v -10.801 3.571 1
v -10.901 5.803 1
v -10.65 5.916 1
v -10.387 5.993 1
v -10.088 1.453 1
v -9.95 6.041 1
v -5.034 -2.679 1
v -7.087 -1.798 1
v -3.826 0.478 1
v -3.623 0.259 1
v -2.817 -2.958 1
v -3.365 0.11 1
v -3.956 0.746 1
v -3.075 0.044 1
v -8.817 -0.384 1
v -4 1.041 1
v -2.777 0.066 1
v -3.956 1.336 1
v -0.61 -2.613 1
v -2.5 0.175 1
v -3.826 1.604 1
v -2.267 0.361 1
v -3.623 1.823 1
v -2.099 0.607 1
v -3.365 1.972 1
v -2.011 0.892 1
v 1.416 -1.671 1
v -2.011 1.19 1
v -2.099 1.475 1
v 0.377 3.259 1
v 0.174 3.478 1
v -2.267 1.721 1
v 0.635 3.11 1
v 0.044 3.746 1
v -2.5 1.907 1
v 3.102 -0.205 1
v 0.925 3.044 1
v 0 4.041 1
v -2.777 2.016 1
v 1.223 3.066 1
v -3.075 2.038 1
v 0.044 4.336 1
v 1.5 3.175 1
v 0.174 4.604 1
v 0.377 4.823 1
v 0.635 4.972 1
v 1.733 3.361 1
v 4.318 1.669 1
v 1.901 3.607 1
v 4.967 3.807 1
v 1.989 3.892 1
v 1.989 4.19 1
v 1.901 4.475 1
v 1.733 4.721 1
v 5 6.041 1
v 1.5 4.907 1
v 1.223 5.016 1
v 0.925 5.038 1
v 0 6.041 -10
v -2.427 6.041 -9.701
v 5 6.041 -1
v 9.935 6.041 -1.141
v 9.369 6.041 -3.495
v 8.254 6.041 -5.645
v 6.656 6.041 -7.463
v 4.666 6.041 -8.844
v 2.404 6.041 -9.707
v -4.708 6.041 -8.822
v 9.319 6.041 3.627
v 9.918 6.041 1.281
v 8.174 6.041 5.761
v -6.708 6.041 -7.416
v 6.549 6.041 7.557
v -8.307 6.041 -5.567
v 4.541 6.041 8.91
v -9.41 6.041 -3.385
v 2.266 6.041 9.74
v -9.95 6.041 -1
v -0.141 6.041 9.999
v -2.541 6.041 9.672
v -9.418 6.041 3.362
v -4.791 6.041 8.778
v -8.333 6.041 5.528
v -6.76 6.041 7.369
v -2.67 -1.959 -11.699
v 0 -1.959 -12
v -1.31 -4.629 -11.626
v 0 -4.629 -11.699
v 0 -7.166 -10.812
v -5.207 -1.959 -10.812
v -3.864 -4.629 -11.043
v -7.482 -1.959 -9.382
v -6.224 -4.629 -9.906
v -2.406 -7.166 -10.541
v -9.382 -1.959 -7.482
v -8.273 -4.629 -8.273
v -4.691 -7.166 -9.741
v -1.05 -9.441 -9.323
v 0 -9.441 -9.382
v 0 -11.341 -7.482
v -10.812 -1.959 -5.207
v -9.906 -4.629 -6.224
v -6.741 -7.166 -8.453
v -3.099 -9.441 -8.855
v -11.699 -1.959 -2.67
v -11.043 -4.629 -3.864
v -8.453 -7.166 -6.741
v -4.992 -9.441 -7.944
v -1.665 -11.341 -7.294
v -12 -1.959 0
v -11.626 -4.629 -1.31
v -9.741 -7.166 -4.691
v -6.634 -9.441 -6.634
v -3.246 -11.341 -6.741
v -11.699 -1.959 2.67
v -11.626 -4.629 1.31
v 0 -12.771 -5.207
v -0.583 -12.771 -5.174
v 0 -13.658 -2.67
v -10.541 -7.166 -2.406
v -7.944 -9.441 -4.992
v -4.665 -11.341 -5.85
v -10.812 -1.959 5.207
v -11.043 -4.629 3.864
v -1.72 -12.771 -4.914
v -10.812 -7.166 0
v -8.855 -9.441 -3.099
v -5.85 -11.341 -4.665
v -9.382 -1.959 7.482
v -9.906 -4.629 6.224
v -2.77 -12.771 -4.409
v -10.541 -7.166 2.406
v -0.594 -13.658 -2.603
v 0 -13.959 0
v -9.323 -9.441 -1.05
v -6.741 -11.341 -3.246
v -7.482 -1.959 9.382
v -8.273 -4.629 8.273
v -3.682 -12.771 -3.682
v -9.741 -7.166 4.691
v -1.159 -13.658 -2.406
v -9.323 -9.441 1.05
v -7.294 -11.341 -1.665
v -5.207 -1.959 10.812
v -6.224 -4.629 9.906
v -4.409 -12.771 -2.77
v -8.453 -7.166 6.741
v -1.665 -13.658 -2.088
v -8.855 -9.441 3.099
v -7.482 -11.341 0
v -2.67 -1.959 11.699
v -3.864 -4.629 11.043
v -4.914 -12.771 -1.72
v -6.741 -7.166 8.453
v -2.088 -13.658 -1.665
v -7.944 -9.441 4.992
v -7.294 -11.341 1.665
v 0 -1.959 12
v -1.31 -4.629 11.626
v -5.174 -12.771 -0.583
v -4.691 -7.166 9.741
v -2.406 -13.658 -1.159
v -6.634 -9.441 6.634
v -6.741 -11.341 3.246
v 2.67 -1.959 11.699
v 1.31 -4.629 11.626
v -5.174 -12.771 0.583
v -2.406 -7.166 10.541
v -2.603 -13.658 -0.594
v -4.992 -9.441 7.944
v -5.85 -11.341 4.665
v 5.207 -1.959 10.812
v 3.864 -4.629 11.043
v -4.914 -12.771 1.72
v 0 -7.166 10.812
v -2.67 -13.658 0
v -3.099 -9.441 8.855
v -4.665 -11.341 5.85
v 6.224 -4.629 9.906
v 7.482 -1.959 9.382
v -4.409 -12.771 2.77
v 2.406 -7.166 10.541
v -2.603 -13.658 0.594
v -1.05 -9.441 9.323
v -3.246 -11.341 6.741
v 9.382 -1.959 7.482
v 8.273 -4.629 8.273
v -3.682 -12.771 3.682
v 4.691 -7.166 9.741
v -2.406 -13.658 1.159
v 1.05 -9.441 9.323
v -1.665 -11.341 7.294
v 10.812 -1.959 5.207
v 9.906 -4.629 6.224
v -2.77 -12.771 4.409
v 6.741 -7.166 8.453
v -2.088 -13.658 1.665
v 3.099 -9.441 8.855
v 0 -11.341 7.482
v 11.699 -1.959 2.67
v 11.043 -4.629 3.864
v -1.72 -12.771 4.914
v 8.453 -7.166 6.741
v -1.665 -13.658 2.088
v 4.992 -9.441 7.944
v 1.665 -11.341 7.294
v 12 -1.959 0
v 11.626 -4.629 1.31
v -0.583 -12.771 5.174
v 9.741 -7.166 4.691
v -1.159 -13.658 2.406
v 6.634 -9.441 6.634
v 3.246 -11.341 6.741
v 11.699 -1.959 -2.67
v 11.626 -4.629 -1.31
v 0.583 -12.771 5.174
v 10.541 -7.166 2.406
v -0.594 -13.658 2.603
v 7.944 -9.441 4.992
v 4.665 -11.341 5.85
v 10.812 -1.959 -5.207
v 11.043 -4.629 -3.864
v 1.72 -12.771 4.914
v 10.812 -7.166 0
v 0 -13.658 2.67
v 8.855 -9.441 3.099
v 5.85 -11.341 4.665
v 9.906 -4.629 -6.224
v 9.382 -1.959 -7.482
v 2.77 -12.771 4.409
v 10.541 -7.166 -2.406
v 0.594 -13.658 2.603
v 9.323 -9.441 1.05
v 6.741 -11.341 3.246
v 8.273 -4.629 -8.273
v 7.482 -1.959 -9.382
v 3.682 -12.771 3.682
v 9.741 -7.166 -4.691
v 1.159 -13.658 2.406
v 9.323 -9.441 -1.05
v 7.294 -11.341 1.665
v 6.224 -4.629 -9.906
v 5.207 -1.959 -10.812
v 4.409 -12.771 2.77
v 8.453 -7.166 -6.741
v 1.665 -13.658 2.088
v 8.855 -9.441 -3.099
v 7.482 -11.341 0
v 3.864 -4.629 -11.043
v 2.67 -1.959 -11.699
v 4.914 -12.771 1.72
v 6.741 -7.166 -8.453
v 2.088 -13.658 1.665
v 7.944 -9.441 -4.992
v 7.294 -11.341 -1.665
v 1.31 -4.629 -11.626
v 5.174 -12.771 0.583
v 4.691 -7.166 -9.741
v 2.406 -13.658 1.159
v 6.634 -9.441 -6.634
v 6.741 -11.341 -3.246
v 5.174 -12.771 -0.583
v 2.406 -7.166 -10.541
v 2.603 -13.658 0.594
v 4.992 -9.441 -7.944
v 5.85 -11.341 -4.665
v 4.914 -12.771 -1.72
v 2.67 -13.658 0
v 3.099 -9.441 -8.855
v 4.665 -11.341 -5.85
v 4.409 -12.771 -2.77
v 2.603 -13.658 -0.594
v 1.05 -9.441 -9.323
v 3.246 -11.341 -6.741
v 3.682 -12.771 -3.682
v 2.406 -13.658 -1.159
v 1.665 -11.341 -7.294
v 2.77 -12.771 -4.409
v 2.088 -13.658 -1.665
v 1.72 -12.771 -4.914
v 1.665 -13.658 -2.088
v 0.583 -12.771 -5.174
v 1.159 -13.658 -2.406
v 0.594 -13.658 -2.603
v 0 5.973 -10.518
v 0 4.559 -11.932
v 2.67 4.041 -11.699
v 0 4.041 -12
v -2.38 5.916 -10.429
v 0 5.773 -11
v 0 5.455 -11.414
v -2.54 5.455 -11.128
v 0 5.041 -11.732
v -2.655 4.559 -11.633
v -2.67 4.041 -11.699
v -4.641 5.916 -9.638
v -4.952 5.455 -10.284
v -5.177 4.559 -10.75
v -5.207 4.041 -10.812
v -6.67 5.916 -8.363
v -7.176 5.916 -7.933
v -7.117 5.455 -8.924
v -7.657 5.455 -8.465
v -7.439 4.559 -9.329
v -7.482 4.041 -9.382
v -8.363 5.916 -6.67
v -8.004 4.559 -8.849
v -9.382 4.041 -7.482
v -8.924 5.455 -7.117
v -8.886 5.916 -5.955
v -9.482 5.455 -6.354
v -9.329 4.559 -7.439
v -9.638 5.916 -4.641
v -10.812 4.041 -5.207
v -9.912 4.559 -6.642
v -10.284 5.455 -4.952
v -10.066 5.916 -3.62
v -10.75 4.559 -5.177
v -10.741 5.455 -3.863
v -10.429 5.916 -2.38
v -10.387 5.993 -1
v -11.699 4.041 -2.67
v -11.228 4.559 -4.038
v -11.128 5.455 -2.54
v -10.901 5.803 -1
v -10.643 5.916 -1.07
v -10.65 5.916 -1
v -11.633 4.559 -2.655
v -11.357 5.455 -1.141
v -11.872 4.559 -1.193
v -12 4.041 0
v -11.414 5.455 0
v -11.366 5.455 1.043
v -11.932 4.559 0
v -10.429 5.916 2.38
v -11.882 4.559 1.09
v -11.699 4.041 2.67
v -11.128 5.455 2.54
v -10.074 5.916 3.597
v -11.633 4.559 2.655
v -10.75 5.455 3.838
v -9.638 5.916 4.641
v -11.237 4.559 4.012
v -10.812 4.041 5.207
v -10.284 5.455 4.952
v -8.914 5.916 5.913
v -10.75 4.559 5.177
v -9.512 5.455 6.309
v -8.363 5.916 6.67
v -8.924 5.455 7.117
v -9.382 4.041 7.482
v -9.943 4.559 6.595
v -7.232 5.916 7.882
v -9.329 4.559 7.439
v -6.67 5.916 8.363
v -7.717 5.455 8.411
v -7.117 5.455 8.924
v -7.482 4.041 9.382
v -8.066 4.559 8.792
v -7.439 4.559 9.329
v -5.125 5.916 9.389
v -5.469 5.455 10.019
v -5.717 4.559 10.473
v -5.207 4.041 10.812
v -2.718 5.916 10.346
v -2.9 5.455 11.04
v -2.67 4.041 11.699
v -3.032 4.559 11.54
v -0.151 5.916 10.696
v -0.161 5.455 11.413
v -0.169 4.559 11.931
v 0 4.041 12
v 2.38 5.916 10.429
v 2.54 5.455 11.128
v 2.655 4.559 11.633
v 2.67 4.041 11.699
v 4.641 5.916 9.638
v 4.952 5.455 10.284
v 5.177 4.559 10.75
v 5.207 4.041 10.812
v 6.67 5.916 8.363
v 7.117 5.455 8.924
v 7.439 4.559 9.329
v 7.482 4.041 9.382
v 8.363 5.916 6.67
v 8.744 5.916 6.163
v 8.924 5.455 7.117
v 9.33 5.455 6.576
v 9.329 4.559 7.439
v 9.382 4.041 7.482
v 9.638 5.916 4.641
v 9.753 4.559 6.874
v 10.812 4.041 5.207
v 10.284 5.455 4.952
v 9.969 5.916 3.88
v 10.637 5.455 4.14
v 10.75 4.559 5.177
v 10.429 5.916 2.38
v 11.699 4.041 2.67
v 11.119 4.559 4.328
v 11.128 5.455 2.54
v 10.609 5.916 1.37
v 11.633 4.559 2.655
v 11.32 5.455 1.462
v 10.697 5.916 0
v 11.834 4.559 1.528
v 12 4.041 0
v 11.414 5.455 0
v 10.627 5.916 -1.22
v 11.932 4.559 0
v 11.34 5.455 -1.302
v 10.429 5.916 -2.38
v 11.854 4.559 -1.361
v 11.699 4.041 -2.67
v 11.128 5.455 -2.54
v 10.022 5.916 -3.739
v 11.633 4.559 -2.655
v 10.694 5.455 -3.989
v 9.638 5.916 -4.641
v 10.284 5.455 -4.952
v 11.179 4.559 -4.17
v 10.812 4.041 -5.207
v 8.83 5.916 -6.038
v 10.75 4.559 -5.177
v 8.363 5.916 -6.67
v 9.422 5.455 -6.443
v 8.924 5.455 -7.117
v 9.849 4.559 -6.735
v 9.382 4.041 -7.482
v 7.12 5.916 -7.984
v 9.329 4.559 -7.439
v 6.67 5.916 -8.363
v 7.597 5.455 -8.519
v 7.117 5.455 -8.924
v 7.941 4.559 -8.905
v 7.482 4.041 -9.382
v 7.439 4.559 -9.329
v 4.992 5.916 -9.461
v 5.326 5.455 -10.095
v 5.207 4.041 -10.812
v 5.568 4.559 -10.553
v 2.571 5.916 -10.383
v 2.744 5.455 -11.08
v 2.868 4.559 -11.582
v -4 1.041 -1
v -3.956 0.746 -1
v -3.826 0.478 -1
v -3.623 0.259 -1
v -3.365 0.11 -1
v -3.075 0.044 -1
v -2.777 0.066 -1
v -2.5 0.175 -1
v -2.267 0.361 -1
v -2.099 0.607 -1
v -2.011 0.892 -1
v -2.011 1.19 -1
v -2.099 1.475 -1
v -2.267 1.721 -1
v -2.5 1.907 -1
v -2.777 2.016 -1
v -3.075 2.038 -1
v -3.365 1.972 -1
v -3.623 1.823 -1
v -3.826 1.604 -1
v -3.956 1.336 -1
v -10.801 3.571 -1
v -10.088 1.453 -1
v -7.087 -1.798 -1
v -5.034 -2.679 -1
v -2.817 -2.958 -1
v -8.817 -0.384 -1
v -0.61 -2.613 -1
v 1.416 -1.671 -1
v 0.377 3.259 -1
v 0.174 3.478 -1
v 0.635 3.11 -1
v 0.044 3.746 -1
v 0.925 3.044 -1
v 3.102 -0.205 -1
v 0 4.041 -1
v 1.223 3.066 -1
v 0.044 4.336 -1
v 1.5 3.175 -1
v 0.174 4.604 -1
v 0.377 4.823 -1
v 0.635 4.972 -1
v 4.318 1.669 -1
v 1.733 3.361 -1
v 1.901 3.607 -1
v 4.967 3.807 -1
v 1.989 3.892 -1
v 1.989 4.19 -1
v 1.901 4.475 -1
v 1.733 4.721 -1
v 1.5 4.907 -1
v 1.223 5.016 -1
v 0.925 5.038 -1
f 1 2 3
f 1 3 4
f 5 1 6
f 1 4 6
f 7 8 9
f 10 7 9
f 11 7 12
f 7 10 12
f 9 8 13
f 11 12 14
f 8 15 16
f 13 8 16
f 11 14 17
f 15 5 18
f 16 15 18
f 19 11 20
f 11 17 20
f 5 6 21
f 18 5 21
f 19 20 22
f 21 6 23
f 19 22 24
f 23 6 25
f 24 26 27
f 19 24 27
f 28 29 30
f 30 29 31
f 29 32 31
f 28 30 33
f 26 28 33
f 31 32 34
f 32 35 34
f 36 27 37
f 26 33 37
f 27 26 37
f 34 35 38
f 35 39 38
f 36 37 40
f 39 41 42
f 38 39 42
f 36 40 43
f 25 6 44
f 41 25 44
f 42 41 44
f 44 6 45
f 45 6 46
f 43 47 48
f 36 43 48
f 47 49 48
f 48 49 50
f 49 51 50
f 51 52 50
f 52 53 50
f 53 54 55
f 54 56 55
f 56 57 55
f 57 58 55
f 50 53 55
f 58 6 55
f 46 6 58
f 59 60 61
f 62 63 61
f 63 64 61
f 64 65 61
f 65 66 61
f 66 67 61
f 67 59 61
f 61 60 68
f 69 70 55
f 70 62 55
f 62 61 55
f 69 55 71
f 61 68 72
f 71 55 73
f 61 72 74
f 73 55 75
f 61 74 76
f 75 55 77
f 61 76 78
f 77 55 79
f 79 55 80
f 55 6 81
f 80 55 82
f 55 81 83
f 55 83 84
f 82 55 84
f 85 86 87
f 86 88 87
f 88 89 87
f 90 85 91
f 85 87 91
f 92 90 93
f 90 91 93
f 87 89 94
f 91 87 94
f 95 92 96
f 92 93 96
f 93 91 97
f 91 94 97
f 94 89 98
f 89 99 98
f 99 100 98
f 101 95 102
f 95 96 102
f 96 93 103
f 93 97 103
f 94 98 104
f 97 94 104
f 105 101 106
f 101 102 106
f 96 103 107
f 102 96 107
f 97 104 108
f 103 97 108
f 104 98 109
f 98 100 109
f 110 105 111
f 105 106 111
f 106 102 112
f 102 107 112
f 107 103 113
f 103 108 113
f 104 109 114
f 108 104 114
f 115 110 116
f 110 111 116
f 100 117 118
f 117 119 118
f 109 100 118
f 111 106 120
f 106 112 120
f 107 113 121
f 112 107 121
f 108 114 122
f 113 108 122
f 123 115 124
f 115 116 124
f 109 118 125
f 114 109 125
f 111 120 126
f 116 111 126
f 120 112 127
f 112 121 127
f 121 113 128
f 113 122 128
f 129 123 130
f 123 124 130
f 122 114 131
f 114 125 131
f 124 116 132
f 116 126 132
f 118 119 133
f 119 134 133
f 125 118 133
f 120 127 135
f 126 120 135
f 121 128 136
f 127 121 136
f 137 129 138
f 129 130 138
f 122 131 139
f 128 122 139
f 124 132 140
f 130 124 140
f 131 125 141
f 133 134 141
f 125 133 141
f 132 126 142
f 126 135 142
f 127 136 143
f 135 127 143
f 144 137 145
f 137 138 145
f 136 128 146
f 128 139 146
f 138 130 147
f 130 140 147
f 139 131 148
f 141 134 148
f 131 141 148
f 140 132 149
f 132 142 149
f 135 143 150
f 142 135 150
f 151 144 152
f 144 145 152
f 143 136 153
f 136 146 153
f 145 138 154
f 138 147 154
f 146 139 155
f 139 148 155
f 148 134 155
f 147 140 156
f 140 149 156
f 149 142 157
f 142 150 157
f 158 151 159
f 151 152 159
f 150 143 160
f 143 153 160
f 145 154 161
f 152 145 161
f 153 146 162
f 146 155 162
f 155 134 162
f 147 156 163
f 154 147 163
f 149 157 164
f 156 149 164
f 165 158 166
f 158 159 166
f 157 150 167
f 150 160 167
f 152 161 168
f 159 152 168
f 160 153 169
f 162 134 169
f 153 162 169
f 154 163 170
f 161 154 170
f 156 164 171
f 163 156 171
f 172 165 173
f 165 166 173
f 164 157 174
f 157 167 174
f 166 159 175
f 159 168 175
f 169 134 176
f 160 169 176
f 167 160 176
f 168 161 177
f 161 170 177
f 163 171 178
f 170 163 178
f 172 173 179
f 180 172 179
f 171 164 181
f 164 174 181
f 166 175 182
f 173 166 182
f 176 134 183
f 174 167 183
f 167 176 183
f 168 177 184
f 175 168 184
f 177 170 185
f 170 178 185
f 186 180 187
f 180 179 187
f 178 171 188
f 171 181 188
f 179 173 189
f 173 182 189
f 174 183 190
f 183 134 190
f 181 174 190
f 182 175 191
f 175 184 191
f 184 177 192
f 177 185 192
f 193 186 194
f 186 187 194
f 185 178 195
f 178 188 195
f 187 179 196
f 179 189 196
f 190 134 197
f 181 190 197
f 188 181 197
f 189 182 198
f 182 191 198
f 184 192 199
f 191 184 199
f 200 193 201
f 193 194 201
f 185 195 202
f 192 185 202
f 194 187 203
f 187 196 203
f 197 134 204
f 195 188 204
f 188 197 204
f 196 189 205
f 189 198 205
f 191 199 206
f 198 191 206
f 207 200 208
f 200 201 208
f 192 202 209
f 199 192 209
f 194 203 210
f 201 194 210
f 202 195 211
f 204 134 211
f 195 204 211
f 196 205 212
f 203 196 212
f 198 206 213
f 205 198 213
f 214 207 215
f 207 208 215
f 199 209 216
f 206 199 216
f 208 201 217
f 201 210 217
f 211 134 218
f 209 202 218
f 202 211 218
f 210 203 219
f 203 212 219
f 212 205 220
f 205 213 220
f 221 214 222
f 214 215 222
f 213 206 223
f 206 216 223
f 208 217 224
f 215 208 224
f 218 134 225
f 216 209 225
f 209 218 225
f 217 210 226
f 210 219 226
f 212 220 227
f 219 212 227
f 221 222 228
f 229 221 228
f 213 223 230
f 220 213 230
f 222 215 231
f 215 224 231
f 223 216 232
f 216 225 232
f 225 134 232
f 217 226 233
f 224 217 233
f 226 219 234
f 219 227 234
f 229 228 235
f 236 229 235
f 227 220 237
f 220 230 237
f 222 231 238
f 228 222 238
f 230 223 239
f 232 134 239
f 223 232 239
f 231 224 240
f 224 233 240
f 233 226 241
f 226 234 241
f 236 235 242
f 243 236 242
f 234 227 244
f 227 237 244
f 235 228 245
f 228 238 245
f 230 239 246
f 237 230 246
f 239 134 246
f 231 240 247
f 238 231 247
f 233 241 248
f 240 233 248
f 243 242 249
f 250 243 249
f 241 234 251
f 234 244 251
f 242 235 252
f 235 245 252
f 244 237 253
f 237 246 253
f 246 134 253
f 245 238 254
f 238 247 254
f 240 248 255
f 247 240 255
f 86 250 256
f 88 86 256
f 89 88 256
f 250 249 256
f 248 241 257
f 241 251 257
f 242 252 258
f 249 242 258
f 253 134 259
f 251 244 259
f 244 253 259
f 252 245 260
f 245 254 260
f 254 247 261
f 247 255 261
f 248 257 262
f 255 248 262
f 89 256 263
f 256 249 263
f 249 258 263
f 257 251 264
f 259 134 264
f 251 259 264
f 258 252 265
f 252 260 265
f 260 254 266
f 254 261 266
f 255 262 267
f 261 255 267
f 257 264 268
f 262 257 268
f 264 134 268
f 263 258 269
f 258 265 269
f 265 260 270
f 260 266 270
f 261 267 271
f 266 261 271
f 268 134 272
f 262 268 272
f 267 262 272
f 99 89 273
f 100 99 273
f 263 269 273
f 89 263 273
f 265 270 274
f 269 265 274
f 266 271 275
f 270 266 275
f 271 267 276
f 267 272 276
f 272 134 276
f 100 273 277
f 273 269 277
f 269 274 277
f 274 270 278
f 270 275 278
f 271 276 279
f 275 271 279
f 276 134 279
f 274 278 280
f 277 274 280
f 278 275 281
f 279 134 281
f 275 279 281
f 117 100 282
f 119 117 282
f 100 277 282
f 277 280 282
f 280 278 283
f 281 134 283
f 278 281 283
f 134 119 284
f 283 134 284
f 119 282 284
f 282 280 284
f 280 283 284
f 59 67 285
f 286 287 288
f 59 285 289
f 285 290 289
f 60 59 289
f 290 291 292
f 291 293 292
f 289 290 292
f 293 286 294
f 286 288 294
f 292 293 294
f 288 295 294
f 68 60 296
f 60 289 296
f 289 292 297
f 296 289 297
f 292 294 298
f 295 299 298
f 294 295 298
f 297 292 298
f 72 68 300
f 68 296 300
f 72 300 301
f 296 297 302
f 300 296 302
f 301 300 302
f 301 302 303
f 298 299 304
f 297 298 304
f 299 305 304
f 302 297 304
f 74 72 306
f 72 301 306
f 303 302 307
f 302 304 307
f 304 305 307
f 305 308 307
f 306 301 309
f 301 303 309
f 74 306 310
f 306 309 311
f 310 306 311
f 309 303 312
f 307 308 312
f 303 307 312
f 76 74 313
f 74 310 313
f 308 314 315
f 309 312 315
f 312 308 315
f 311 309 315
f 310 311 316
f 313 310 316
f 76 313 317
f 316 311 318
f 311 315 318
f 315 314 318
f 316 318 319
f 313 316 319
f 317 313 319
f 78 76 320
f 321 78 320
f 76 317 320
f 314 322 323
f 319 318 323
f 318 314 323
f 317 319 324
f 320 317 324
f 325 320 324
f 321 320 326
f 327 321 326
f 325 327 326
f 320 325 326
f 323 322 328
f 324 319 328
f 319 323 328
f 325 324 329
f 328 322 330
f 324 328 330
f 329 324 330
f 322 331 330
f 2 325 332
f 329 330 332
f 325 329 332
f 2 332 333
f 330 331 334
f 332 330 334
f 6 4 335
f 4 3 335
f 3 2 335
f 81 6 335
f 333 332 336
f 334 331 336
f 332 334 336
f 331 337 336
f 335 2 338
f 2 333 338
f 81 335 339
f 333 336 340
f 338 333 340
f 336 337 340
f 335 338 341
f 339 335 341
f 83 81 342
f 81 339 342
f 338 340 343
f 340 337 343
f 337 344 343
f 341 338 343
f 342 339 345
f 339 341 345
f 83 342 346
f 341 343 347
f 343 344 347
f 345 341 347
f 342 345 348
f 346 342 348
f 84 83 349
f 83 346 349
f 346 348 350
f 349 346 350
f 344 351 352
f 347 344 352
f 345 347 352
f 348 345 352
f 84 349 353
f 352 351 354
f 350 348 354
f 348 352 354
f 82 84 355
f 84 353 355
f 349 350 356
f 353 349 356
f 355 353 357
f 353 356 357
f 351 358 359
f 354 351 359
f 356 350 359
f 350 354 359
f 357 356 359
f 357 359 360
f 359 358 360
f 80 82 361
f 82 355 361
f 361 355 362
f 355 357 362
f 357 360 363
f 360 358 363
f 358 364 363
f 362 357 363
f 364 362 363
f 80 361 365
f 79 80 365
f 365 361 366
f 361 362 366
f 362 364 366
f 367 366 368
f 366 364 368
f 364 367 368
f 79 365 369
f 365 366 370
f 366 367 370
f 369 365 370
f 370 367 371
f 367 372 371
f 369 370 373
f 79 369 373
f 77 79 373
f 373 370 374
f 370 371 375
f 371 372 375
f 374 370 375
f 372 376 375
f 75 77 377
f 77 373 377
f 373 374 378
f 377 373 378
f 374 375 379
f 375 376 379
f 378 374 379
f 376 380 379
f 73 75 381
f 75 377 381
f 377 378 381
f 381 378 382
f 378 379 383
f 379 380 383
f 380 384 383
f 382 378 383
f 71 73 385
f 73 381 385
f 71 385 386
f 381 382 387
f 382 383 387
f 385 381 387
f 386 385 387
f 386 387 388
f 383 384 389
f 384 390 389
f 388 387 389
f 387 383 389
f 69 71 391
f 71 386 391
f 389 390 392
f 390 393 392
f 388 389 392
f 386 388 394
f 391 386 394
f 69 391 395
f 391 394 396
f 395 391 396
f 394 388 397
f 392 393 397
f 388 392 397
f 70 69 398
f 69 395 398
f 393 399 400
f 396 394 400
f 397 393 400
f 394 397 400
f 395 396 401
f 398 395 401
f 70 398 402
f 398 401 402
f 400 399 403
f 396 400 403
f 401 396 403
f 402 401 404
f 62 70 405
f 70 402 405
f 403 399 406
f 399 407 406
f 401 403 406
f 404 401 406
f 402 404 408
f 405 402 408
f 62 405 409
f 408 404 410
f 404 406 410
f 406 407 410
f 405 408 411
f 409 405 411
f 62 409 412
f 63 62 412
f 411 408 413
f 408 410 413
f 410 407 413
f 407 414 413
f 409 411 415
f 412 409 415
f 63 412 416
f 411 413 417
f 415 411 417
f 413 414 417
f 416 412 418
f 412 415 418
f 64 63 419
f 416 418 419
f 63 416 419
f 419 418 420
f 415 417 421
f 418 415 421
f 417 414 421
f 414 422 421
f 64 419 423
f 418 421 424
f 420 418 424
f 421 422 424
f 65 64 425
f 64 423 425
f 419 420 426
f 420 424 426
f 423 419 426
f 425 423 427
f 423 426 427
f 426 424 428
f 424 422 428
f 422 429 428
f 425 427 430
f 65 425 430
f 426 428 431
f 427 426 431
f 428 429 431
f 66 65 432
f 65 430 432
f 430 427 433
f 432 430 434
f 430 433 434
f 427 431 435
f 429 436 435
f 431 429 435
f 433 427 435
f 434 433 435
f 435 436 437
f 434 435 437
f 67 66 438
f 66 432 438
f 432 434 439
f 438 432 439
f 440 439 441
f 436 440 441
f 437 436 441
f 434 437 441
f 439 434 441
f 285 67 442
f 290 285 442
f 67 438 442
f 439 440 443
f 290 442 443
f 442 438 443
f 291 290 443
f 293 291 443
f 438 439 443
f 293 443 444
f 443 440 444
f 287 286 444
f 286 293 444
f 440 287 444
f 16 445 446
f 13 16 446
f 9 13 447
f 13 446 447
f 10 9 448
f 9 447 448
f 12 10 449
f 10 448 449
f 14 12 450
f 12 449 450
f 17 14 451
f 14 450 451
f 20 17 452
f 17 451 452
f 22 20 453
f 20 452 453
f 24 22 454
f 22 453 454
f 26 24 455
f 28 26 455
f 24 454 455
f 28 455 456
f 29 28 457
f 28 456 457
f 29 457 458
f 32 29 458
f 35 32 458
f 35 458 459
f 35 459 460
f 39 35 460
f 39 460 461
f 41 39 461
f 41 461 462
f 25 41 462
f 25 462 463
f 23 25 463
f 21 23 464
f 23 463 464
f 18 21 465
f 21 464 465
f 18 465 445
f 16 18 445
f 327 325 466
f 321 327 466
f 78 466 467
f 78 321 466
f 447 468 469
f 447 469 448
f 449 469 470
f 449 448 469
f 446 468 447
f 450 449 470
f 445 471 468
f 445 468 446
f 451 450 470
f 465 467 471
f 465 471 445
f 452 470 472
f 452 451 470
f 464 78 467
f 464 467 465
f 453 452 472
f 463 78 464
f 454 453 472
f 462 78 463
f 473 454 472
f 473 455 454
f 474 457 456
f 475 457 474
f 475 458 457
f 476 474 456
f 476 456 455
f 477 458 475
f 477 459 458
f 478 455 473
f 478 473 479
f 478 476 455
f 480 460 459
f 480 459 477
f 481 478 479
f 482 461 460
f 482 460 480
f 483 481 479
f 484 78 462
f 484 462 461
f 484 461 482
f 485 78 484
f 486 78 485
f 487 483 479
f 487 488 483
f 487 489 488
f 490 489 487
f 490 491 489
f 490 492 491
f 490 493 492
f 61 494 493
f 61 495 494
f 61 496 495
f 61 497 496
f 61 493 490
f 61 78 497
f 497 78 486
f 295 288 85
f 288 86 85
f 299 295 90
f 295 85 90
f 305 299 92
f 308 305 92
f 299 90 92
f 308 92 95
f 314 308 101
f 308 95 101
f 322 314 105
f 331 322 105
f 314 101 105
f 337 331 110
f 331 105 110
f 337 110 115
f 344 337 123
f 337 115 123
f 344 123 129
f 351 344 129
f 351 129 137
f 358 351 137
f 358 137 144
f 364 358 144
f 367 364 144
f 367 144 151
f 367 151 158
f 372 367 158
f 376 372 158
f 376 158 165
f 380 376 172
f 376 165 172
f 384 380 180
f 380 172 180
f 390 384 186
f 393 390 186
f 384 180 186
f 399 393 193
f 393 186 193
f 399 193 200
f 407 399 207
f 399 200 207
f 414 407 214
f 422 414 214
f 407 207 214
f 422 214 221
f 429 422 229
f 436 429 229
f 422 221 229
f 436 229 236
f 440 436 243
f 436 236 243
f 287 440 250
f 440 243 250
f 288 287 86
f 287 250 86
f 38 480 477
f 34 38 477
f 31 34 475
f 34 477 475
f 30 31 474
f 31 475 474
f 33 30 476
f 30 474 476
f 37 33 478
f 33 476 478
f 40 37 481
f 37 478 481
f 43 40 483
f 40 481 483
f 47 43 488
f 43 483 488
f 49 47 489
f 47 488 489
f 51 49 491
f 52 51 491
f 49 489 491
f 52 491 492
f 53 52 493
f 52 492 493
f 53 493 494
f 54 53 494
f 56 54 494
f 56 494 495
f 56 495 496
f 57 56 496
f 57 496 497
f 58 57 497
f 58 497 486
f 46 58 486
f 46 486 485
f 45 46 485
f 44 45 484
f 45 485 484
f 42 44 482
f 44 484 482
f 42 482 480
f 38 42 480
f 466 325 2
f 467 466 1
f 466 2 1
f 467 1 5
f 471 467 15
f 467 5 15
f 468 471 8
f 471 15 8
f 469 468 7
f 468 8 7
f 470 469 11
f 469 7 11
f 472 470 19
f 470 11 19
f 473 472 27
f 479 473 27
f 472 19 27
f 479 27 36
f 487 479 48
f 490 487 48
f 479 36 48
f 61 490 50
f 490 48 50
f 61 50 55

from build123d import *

# Parameters (mm, degrees)
CUT_EXTRUDE_2_DEPTH = 1
SKETCH_3_R          = 1
EXTRUDE_2_DEPTH     = 2


with BuildPart() as part:
    # 草图1 → 旋转1 (revolve)
    with BuildSketch(Plane.XY, mode=Mode.PRIVATE) as revolve_1_sk:
        with BuildLine():
            Line((0, 6.040955631), (10, 6.040955631))
            ThreePointArc((10, 6.040955631), (11.414213562, 5.455169194), (12, 4.040955631))
            Line((12, 4.040955631), (12, -1.959044369))
            ThreePointArc((12, -1.959044369), (8.485281374, -10.444325743), (0, -13.959044369))
            Line((0, -13.959044369), (0, 6.040955631))
        make_face()
    revolve(revolve_1_sk.sketch.rotate(Axis((0, -13.959044369, 0), (0, 1, 0)), 90), axis=Axis((0, -13.959044369, 0), (0, 1, 0)))

    # 草图2 → 切除-拉伸2 (cut, symmetric)
    with BuildSketch(Plane.XY):
        with BuildLine():
            Line((5, 6.040955631), (-10, 6.040955631))
            ThreePointArc((-10, 6.040955631), (-10.461704233, 5.986933329), (-10.89846614, 5.827784833))
            ThreePointArc((-10.89846614, 5.827784833), (-2.829997478, -2.95832534), (5, 6.040955631))
        make_face()
    extrude(amount=CUT_EXTRUDE_2_DEPTH, both=True, mode=Mode.SUBTRACT)

    # 草图3 → 凸台-拉伸2 (add)
    with BuildSketch(Plane.XY.offset(-1)):
        with Locations(Location((-3, 1.040955631, 0), (0, 0, 180))):
            Circle(SKETCH_3_R)
        with Locations(Location((1, 4.040955631, 0), (0, 0, 180))):
            Circle(SKETCH_3_R)
    extrude(amount=EXTRUDE_2_DEPTH)


solid = part.part
